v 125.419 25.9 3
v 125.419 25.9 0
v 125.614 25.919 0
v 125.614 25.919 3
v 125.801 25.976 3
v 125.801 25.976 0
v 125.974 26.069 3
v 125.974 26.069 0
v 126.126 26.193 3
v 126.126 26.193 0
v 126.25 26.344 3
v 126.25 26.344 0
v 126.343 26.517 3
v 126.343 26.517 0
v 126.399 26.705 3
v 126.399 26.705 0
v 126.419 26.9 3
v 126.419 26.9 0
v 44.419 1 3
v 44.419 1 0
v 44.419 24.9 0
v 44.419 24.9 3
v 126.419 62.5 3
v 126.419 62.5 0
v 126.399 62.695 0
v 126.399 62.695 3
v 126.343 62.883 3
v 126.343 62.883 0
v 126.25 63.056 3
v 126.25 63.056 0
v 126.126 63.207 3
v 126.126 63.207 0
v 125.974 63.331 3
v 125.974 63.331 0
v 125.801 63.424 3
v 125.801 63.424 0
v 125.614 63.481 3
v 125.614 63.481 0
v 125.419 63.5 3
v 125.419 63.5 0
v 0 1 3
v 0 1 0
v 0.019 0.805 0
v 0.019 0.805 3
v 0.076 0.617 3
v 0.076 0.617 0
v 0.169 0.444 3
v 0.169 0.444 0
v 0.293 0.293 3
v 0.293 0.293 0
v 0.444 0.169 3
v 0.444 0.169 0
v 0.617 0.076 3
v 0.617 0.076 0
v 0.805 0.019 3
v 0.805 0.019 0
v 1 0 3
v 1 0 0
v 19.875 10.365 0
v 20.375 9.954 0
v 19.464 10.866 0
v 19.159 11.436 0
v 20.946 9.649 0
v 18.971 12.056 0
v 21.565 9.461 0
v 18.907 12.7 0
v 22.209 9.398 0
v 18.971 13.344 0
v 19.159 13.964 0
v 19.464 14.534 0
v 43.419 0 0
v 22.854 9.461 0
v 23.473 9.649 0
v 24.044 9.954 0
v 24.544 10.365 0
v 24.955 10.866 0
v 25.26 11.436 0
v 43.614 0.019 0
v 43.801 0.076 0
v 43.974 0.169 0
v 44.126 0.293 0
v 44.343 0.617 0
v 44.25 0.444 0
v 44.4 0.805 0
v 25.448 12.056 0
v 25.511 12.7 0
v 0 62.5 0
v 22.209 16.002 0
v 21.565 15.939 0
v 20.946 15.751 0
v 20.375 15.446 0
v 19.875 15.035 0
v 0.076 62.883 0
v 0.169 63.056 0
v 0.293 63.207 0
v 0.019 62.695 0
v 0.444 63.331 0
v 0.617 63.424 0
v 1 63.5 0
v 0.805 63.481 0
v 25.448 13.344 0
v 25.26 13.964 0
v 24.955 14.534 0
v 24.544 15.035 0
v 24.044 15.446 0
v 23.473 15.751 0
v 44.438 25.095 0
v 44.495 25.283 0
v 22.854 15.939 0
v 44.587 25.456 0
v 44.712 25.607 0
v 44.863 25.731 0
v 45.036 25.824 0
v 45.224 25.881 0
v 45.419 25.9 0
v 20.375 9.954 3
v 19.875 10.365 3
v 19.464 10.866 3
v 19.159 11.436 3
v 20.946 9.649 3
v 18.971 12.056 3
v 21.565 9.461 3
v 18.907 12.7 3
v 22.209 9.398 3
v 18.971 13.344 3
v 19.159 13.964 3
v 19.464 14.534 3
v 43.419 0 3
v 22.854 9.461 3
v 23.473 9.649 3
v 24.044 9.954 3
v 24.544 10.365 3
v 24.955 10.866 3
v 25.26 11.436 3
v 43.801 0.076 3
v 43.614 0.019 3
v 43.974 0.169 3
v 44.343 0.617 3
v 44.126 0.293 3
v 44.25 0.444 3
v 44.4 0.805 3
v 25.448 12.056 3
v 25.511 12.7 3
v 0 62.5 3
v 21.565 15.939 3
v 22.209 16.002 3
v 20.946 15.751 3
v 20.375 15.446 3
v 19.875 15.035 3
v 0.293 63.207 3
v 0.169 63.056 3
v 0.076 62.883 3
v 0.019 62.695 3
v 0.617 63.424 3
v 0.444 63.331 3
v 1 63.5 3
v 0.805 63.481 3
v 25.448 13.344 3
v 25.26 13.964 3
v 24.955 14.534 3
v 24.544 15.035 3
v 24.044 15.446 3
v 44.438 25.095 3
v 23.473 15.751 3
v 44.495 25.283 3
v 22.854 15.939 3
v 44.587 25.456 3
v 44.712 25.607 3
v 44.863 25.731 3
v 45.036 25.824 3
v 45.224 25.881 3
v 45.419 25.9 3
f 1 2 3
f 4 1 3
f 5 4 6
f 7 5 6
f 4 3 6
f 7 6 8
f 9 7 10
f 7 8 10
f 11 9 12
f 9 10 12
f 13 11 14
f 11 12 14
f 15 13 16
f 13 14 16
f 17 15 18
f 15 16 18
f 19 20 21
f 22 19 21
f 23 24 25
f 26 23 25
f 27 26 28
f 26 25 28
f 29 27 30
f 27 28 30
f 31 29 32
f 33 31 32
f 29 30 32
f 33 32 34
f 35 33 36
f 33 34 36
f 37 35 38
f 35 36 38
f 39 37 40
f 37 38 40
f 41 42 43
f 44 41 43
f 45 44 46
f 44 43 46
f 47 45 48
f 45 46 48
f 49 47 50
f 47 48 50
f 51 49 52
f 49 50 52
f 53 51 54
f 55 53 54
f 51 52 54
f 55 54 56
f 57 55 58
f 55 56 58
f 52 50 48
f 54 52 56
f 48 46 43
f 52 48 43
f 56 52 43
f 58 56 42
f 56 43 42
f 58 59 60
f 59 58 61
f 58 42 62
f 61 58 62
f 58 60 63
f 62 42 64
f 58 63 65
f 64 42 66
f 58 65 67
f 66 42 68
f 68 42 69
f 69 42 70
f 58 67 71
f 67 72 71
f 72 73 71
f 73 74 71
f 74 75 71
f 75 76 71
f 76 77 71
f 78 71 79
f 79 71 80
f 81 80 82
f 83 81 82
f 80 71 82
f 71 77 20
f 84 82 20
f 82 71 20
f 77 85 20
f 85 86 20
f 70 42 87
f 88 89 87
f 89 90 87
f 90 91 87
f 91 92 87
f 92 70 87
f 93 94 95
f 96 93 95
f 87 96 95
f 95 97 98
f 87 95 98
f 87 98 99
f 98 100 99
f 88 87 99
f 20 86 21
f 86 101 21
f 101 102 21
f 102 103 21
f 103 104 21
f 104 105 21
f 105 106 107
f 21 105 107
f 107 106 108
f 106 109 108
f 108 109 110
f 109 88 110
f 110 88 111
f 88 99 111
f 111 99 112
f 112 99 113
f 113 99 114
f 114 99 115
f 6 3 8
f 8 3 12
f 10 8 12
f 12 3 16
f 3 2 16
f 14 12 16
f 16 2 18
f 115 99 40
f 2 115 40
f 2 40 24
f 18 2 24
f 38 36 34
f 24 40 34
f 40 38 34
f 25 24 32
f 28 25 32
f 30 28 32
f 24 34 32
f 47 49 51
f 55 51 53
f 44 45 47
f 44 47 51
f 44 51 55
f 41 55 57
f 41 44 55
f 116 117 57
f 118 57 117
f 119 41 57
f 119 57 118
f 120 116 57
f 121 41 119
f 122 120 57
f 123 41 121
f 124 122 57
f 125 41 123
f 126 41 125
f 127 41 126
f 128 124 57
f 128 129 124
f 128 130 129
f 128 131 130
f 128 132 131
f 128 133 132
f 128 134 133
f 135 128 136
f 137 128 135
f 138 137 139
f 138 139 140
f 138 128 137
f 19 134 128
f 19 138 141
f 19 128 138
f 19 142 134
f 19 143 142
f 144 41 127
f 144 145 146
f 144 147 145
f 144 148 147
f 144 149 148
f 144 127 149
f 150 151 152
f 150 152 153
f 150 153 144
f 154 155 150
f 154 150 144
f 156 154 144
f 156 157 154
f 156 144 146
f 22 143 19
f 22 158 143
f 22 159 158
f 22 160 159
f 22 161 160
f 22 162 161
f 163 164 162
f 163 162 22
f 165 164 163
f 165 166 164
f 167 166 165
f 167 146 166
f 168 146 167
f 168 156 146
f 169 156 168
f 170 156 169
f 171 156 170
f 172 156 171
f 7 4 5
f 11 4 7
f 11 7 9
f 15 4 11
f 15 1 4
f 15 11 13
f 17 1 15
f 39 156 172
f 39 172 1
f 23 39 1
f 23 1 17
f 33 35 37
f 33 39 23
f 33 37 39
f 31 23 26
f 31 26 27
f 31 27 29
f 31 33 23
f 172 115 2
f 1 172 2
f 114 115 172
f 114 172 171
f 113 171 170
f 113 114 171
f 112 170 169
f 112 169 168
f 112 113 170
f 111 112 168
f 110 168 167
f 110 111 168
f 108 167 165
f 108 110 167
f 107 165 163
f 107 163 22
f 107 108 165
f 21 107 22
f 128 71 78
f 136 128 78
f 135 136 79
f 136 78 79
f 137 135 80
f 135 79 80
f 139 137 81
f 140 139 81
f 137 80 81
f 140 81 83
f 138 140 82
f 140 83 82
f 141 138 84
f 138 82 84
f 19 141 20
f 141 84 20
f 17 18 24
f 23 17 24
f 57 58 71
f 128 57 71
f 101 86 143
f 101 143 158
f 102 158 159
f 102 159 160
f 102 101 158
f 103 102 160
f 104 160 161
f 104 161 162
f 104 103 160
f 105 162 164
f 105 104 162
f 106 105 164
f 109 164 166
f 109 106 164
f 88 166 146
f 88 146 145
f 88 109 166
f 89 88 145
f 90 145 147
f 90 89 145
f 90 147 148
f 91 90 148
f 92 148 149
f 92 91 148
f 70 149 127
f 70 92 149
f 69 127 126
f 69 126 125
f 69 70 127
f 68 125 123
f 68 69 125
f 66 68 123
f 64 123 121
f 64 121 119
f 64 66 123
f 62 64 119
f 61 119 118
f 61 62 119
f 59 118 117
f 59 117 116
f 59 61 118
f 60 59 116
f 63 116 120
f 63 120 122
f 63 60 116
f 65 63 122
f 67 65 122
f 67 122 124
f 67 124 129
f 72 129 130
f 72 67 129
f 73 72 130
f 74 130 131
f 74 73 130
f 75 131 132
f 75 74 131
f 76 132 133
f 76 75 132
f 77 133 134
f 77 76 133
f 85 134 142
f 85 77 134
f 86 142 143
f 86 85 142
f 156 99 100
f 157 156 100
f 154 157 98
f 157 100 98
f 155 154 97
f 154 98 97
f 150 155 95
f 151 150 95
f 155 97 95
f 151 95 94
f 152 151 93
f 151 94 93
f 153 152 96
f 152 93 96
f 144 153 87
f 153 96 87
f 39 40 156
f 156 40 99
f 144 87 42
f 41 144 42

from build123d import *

# Parameters (mm, degrees)
SKETCH_R  = 3.302
PAD_DEPTH = 3


with BuildPart() as part:
    # Sketch → Pad (new body)
    with BuildSketch(Plane.XY):
        with BuildLine():
            Line((0, 62.5), (0, 1))
            ThreePointArc((0, 1), (0.292893, 0.292893), (1, 0))
            Line((1, 0), (43.41875, 0))
            ThreePointArc((43.41875, 0), (44.125857, 0.292893), (44.41875, 1))
            Line((44.41875, 1), (44.41875, 24.9))
            ThreePointArc((45.41875, 25.9), (44.711643, 25.607107), (44.41875, 24.9))
            Line((45.41875, 25.9), (125.41865, 25.9))
            ThreePointArc((125.41865, 25.9), (126.125757, 26.192893), (126.41865, 26.9))
            Line((126.41865, 26.9), (126.41865, 62.5))
            ThreePointArc((126.41865, 62.5), (126.125757, 63.207107), (125.41865, 63.5))
            Line((125.41865, 63.5), (1, 63.5))
            ThreePointArc((1, 63.5), (0.292893, 63.207107), (0, 62.5))
        make_face()
        with Locations((22.209375, 12.7)):
            Circle(SKETCH_R, mode=Mode.SUBTRACT)
    extrude(amount=PAD_DEPTH)


solid = part.part
